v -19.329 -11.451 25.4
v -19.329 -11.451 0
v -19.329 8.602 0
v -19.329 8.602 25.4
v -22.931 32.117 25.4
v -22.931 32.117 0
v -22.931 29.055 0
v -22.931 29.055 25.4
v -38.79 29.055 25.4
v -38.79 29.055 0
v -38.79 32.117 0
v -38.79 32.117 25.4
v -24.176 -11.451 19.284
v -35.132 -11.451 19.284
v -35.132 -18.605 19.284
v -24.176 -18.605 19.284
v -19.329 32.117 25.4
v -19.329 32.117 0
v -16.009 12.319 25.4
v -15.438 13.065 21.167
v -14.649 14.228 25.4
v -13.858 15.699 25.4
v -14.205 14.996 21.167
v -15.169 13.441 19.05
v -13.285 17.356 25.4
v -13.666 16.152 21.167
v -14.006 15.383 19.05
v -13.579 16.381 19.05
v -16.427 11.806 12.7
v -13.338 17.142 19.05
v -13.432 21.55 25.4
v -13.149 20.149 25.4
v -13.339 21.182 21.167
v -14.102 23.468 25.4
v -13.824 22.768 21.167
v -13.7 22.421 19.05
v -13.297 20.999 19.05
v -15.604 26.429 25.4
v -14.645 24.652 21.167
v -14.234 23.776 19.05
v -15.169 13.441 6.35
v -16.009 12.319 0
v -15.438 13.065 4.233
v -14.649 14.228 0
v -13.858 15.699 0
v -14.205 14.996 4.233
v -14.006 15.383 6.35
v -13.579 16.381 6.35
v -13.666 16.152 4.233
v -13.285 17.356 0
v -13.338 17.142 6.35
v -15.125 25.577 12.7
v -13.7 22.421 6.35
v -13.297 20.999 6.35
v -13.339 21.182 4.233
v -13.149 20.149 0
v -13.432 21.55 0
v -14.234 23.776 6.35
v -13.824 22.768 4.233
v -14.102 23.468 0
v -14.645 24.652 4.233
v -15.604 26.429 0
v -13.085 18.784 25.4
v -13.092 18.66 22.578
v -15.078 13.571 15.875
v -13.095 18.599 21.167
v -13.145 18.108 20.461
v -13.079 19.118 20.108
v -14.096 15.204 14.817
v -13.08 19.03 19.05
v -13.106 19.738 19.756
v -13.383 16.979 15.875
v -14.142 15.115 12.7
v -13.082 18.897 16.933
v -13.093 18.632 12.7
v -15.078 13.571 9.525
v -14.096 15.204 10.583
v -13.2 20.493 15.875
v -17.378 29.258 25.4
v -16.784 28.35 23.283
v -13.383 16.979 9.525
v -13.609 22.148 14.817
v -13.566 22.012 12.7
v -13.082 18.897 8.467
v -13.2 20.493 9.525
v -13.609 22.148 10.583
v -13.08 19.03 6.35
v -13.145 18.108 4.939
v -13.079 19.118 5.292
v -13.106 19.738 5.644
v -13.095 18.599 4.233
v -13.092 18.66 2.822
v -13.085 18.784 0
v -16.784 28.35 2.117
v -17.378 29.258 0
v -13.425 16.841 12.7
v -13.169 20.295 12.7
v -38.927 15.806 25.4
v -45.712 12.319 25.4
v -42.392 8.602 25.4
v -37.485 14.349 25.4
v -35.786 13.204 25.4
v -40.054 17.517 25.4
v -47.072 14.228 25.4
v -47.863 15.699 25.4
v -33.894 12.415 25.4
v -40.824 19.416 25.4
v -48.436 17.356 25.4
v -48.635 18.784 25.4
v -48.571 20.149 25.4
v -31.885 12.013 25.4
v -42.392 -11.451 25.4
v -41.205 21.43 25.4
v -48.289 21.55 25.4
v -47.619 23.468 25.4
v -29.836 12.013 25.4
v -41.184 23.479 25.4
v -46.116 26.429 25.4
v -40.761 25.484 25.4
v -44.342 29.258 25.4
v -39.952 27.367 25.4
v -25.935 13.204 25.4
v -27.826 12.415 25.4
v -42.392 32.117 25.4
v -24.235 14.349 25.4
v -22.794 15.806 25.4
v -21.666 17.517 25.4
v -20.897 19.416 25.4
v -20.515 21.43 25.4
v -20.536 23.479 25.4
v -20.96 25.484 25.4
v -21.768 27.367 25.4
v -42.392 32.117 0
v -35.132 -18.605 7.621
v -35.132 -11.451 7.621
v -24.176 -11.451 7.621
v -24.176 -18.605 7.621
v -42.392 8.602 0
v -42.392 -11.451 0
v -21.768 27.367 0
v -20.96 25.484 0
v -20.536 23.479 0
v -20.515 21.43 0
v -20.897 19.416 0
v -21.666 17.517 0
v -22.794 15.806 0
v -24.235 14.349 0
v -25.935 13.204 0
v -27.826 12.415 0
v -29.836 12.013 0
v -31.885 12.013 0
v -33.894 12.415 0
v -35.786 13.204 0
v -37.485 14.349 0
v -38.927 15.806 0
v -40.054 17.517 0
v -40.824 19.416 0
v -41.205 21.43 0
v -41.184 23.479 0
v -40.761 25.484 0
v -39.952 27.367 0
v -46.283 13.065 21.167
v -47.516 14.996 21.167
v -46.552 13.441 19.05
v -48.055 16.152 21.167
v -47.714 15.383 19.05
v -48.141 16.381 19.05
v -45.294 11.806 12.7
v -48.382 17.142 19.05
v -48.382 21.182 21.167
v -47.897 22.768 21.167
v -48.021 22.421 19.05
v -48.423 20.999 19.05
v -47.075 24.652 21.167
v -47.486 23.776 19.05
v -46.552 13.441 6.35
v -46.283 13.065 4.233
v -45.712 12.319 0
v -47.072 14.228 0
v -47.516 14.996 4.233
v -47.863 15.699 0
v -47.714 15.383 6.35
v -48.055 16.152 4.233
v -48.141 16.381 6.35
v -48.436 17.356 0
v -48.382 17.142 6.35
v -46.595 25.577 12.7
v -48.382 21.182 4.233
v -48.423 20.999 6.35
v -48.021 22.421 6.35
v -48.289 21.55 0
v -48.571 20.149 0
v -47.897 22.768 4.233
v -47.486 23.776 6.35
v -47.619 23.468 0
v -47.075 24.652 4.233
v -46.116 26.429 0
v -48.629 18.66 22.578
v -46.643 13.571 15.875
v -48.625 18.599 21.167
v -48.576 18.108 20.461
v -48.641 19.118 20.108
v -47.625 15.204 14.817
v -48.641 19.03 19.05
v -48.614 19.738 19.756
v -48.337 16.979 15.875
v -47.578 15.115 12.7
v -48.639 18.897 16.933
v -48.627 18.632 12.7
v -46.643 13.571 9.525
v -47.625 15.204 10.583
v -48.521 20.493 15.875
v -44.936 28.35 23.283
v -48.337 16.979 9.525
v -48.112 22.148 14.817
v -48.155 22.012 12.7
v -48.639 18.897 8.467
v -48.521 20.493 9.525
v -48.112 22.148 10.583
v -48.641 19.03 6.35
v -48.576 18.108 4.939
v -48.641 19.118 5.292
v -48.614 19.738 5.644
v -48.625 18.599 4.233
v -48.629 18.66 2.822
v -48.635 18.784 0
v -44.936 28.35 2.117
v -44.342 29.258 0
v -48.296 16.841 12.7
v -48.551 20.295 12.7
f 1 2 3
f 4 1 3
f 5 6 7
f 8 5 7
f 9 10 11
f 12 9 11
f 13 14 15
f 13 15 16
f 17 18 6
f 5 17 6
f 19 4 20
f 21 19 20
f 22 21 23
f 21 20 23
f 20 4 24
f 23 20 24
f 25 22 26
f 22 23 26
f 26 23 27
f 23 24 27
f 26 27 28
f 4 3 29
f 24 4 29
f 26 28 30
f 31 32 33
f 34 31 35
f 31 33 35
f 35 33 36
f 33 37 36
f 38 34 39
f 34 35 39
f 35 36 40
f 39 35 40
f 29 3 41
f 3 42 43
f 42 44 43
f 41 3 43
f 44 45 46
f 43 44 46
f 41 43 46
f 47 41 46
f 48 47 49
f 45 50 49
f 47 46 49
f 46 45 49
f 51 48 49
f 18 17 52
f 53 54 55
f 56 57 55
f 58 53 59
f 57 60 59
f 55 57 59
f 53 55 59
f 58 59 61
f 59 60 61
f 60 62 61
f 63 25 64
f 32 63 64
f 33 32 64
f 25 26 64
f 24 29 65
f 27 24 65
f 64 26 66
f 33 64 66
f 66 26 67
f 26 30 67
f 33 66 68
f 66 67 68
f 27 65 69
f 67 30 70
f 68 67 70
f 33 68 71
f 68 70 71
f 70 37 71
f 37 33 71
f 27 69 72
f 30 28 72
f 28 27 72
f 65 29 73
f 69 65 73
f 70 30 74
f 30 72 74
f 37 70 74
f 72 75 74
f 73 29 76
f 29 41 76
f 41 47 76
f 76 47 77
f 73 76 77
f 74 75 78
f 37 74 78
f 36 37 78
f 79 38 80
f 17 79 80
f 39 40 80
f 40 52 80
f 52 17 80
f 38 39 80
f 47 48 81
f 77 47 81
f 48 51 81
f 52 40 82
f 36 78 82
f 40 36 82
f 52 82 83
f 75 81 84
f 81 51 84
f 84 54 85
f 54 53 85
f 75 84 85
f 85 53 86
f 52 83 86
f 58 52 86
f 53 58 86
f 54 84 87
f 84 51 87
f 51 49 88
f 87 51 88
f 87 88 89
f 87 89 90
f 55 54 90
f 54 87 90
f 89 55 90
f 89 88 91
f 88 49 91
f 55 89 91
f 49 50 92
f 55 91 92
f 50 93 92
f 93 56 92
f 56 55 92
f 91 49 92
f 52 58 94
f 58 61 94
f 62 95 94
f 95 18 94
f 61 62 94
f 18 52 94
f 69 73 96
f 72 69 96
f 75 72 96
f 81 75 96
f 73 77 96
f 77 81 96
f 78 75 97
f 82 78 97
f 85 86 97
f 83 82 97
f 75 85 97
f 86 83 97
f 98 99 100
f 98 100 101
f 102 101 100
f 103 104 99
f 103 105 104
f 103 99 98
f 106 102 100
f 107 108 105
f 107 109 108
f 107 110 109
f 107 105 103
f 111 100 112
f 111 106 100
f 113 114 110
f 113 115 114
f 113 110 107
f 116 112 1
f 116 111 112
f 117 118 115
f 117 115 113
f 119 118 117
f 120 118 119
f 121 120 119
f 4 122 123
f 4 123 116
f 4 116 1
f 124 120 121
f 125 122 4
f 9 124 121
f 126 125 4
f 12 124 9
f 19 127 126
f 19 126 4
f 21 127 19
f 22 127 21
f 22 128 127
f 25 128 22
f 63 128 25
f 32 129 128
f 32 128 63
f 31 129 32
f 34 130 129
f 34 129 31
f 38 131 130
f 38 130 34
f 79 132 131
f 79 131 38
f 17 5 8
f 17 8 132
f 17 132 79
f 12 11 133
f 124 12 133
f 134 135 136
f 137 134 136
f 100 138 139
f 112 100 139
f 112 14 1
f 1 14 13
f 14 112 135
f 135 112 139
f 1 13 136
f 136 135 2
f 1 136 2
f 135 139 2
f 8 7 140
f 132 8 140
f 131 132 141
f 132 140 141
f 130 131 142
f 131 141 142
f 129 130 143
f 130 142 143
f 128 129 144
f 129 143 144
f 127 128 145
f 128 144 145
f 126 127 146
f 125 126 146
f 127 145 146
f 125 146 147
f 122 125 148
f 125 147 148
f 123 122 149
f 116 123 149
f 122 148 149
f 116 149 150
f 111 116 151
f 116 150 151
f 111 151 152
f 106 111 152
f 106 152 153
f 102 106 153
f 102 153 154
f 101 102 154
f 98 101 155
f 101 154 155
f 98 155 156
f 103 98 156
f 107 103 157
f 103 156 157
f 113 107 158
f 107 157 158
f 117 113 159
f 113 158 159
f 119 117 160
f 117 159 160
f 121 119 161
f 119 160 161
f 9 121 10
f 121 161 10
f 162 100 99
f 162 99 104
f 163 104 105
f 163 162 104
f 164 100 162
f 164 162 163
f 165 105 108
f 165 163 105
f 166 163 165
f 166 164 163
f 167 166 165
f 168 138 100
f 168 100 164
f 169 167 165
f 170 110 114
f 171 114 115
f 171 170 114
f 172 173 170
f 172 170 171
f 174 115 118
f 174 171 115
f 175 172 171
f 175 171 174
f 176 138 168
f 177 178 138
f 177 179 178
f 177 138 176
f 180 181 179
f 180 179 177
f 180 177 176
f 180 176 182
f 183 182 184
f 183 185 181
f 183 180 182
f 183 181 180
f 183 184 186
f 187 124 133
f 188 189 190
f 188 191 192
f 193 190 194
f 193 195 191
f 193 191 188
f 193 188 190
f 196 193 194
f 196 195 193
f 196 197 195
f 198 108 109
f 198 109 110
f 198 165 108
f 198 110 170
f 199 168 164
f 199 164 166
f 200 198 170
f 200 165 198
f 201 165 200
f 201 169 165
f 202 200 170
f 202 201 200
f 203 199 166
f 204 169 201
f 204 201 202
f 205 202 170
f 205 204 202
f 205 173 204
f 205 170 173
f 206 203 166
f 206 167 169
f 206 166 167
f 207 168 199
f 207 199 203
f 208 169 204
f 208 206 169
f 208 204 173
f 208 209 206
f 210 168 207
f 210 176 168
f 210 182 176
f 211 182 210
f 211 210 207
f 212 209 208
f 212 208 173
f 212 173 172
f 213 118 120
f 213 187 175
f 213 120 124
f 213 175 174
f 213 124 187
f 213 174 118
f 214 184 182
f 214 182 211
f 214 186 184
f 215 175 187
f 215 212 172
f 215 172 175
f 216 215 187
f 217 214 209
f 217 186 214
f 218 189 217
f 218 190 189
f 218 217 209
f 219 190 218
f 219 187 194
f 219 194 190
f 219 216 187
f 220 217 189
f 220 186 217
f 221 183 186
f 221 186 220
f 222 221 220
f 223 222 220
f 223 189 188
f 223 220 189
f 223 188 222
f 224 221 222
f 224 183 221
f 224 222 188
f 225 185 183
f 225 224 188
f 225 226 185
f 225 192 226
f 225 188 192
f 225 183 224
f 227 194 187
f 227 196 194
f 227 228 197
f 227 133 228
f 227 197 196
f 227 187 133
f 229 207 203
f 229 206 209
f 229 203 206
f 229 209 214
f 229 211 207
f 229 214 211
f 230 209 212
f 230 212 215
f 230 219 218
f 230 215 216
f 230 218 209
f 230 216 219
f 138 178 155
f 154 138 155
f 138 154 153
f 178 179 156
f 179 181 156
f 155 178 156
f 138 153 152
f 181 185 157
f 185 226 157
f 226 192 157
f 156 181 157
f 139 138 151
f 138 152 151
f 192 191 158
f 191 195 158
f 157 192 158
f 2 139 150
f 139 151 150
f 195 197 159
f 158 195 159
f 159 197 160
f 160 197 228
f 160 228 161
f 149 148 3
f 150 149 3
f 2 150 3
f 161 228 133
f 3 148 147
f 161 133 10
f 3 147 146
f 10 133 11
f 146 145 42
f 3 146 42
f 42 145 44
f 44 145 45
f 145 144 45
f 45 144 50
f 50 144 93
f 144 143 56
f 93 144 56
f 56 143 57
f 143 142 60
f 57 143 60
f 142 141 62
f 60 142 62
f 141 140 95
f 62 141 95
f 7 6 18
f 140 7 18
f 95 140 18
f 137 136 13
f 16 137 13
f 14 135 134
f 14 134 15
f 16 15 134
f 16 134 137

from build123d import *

# Parameters (mm, degrees)
F1_DEPTH = 25.4
F3_W     = 10.9566785395
F3_H     = 11.6627290845
F4_DEPTH = 7.1539785713


with BuildPart() as f1:
    # F0 (on Top) → F1 (new body)
    with BuildSketch(Plane.XY):
        with BuildLine():
            Line((-42.3919206649, 8.6023595556), (-42.3919206649, -11.4512224138))
            Line((-42.3919206649, -11.4512224138), (-19.3287206649, -11.4512224138))
            Line((-19.3287206649, -11.4512224138), (-19.3287206649, 8.6023595556))
            add(Edge.make_bspline(
                [(-19.3287206649, 8.6023595556), (-16.323673708, 11.7888919971), (-9.9481352571, 18.5494707236), (-16.0846098572, 27.4246591557), (-19.3287206649, 32.1166146935)],
                knots=[0, 0, 0, 0, 0.4713400446, 1, 1, 1, 1], degree=3))
            Line((-19.3287206649, 32.1166146935), (-22.9309096968, 32.1166146935))
            Line((-22.9309096968, 32.1166146935), (-22.9309096968, 29.055005683))
            ThreePointArc((-22.9309096968, 29.055005683), (-30.8603206649, 11.9618341392), (-38.7897316331, 29.055005683))
            Line((-38.7897316331, 29.055005683), (-38.7897316331, 32.1166146935))
            Line((-38.7897316331, 32.1166146935), (-42.3919206649, 32.1166146935))
            add(Edge.make_bspline(
                [(-42.3919206649, 8.6023595556), (-45.3969676218, 11.7888919971), (-51.7725060727, 18.5494707236), (-45.6360314726, 27.4246591557), (-42.3919206649, 32.1166146935)],
                knots=[0, 0, 0, 0, 0.4713400446, 1, 1, 1, 1], degree=3))
        make_face()
    extrude(amount=F1_DEPTH)

    # F3 (on face) → F4 (join)
    with BuildSketch(Plane.XZ.offset(11.4512224138)):
        with Locations((-29.654065147, 13.45269382)):
            Rectangle(F3_W, F3_H)
    extrude(amount=F4_DEPTH)


solid = f1.part
